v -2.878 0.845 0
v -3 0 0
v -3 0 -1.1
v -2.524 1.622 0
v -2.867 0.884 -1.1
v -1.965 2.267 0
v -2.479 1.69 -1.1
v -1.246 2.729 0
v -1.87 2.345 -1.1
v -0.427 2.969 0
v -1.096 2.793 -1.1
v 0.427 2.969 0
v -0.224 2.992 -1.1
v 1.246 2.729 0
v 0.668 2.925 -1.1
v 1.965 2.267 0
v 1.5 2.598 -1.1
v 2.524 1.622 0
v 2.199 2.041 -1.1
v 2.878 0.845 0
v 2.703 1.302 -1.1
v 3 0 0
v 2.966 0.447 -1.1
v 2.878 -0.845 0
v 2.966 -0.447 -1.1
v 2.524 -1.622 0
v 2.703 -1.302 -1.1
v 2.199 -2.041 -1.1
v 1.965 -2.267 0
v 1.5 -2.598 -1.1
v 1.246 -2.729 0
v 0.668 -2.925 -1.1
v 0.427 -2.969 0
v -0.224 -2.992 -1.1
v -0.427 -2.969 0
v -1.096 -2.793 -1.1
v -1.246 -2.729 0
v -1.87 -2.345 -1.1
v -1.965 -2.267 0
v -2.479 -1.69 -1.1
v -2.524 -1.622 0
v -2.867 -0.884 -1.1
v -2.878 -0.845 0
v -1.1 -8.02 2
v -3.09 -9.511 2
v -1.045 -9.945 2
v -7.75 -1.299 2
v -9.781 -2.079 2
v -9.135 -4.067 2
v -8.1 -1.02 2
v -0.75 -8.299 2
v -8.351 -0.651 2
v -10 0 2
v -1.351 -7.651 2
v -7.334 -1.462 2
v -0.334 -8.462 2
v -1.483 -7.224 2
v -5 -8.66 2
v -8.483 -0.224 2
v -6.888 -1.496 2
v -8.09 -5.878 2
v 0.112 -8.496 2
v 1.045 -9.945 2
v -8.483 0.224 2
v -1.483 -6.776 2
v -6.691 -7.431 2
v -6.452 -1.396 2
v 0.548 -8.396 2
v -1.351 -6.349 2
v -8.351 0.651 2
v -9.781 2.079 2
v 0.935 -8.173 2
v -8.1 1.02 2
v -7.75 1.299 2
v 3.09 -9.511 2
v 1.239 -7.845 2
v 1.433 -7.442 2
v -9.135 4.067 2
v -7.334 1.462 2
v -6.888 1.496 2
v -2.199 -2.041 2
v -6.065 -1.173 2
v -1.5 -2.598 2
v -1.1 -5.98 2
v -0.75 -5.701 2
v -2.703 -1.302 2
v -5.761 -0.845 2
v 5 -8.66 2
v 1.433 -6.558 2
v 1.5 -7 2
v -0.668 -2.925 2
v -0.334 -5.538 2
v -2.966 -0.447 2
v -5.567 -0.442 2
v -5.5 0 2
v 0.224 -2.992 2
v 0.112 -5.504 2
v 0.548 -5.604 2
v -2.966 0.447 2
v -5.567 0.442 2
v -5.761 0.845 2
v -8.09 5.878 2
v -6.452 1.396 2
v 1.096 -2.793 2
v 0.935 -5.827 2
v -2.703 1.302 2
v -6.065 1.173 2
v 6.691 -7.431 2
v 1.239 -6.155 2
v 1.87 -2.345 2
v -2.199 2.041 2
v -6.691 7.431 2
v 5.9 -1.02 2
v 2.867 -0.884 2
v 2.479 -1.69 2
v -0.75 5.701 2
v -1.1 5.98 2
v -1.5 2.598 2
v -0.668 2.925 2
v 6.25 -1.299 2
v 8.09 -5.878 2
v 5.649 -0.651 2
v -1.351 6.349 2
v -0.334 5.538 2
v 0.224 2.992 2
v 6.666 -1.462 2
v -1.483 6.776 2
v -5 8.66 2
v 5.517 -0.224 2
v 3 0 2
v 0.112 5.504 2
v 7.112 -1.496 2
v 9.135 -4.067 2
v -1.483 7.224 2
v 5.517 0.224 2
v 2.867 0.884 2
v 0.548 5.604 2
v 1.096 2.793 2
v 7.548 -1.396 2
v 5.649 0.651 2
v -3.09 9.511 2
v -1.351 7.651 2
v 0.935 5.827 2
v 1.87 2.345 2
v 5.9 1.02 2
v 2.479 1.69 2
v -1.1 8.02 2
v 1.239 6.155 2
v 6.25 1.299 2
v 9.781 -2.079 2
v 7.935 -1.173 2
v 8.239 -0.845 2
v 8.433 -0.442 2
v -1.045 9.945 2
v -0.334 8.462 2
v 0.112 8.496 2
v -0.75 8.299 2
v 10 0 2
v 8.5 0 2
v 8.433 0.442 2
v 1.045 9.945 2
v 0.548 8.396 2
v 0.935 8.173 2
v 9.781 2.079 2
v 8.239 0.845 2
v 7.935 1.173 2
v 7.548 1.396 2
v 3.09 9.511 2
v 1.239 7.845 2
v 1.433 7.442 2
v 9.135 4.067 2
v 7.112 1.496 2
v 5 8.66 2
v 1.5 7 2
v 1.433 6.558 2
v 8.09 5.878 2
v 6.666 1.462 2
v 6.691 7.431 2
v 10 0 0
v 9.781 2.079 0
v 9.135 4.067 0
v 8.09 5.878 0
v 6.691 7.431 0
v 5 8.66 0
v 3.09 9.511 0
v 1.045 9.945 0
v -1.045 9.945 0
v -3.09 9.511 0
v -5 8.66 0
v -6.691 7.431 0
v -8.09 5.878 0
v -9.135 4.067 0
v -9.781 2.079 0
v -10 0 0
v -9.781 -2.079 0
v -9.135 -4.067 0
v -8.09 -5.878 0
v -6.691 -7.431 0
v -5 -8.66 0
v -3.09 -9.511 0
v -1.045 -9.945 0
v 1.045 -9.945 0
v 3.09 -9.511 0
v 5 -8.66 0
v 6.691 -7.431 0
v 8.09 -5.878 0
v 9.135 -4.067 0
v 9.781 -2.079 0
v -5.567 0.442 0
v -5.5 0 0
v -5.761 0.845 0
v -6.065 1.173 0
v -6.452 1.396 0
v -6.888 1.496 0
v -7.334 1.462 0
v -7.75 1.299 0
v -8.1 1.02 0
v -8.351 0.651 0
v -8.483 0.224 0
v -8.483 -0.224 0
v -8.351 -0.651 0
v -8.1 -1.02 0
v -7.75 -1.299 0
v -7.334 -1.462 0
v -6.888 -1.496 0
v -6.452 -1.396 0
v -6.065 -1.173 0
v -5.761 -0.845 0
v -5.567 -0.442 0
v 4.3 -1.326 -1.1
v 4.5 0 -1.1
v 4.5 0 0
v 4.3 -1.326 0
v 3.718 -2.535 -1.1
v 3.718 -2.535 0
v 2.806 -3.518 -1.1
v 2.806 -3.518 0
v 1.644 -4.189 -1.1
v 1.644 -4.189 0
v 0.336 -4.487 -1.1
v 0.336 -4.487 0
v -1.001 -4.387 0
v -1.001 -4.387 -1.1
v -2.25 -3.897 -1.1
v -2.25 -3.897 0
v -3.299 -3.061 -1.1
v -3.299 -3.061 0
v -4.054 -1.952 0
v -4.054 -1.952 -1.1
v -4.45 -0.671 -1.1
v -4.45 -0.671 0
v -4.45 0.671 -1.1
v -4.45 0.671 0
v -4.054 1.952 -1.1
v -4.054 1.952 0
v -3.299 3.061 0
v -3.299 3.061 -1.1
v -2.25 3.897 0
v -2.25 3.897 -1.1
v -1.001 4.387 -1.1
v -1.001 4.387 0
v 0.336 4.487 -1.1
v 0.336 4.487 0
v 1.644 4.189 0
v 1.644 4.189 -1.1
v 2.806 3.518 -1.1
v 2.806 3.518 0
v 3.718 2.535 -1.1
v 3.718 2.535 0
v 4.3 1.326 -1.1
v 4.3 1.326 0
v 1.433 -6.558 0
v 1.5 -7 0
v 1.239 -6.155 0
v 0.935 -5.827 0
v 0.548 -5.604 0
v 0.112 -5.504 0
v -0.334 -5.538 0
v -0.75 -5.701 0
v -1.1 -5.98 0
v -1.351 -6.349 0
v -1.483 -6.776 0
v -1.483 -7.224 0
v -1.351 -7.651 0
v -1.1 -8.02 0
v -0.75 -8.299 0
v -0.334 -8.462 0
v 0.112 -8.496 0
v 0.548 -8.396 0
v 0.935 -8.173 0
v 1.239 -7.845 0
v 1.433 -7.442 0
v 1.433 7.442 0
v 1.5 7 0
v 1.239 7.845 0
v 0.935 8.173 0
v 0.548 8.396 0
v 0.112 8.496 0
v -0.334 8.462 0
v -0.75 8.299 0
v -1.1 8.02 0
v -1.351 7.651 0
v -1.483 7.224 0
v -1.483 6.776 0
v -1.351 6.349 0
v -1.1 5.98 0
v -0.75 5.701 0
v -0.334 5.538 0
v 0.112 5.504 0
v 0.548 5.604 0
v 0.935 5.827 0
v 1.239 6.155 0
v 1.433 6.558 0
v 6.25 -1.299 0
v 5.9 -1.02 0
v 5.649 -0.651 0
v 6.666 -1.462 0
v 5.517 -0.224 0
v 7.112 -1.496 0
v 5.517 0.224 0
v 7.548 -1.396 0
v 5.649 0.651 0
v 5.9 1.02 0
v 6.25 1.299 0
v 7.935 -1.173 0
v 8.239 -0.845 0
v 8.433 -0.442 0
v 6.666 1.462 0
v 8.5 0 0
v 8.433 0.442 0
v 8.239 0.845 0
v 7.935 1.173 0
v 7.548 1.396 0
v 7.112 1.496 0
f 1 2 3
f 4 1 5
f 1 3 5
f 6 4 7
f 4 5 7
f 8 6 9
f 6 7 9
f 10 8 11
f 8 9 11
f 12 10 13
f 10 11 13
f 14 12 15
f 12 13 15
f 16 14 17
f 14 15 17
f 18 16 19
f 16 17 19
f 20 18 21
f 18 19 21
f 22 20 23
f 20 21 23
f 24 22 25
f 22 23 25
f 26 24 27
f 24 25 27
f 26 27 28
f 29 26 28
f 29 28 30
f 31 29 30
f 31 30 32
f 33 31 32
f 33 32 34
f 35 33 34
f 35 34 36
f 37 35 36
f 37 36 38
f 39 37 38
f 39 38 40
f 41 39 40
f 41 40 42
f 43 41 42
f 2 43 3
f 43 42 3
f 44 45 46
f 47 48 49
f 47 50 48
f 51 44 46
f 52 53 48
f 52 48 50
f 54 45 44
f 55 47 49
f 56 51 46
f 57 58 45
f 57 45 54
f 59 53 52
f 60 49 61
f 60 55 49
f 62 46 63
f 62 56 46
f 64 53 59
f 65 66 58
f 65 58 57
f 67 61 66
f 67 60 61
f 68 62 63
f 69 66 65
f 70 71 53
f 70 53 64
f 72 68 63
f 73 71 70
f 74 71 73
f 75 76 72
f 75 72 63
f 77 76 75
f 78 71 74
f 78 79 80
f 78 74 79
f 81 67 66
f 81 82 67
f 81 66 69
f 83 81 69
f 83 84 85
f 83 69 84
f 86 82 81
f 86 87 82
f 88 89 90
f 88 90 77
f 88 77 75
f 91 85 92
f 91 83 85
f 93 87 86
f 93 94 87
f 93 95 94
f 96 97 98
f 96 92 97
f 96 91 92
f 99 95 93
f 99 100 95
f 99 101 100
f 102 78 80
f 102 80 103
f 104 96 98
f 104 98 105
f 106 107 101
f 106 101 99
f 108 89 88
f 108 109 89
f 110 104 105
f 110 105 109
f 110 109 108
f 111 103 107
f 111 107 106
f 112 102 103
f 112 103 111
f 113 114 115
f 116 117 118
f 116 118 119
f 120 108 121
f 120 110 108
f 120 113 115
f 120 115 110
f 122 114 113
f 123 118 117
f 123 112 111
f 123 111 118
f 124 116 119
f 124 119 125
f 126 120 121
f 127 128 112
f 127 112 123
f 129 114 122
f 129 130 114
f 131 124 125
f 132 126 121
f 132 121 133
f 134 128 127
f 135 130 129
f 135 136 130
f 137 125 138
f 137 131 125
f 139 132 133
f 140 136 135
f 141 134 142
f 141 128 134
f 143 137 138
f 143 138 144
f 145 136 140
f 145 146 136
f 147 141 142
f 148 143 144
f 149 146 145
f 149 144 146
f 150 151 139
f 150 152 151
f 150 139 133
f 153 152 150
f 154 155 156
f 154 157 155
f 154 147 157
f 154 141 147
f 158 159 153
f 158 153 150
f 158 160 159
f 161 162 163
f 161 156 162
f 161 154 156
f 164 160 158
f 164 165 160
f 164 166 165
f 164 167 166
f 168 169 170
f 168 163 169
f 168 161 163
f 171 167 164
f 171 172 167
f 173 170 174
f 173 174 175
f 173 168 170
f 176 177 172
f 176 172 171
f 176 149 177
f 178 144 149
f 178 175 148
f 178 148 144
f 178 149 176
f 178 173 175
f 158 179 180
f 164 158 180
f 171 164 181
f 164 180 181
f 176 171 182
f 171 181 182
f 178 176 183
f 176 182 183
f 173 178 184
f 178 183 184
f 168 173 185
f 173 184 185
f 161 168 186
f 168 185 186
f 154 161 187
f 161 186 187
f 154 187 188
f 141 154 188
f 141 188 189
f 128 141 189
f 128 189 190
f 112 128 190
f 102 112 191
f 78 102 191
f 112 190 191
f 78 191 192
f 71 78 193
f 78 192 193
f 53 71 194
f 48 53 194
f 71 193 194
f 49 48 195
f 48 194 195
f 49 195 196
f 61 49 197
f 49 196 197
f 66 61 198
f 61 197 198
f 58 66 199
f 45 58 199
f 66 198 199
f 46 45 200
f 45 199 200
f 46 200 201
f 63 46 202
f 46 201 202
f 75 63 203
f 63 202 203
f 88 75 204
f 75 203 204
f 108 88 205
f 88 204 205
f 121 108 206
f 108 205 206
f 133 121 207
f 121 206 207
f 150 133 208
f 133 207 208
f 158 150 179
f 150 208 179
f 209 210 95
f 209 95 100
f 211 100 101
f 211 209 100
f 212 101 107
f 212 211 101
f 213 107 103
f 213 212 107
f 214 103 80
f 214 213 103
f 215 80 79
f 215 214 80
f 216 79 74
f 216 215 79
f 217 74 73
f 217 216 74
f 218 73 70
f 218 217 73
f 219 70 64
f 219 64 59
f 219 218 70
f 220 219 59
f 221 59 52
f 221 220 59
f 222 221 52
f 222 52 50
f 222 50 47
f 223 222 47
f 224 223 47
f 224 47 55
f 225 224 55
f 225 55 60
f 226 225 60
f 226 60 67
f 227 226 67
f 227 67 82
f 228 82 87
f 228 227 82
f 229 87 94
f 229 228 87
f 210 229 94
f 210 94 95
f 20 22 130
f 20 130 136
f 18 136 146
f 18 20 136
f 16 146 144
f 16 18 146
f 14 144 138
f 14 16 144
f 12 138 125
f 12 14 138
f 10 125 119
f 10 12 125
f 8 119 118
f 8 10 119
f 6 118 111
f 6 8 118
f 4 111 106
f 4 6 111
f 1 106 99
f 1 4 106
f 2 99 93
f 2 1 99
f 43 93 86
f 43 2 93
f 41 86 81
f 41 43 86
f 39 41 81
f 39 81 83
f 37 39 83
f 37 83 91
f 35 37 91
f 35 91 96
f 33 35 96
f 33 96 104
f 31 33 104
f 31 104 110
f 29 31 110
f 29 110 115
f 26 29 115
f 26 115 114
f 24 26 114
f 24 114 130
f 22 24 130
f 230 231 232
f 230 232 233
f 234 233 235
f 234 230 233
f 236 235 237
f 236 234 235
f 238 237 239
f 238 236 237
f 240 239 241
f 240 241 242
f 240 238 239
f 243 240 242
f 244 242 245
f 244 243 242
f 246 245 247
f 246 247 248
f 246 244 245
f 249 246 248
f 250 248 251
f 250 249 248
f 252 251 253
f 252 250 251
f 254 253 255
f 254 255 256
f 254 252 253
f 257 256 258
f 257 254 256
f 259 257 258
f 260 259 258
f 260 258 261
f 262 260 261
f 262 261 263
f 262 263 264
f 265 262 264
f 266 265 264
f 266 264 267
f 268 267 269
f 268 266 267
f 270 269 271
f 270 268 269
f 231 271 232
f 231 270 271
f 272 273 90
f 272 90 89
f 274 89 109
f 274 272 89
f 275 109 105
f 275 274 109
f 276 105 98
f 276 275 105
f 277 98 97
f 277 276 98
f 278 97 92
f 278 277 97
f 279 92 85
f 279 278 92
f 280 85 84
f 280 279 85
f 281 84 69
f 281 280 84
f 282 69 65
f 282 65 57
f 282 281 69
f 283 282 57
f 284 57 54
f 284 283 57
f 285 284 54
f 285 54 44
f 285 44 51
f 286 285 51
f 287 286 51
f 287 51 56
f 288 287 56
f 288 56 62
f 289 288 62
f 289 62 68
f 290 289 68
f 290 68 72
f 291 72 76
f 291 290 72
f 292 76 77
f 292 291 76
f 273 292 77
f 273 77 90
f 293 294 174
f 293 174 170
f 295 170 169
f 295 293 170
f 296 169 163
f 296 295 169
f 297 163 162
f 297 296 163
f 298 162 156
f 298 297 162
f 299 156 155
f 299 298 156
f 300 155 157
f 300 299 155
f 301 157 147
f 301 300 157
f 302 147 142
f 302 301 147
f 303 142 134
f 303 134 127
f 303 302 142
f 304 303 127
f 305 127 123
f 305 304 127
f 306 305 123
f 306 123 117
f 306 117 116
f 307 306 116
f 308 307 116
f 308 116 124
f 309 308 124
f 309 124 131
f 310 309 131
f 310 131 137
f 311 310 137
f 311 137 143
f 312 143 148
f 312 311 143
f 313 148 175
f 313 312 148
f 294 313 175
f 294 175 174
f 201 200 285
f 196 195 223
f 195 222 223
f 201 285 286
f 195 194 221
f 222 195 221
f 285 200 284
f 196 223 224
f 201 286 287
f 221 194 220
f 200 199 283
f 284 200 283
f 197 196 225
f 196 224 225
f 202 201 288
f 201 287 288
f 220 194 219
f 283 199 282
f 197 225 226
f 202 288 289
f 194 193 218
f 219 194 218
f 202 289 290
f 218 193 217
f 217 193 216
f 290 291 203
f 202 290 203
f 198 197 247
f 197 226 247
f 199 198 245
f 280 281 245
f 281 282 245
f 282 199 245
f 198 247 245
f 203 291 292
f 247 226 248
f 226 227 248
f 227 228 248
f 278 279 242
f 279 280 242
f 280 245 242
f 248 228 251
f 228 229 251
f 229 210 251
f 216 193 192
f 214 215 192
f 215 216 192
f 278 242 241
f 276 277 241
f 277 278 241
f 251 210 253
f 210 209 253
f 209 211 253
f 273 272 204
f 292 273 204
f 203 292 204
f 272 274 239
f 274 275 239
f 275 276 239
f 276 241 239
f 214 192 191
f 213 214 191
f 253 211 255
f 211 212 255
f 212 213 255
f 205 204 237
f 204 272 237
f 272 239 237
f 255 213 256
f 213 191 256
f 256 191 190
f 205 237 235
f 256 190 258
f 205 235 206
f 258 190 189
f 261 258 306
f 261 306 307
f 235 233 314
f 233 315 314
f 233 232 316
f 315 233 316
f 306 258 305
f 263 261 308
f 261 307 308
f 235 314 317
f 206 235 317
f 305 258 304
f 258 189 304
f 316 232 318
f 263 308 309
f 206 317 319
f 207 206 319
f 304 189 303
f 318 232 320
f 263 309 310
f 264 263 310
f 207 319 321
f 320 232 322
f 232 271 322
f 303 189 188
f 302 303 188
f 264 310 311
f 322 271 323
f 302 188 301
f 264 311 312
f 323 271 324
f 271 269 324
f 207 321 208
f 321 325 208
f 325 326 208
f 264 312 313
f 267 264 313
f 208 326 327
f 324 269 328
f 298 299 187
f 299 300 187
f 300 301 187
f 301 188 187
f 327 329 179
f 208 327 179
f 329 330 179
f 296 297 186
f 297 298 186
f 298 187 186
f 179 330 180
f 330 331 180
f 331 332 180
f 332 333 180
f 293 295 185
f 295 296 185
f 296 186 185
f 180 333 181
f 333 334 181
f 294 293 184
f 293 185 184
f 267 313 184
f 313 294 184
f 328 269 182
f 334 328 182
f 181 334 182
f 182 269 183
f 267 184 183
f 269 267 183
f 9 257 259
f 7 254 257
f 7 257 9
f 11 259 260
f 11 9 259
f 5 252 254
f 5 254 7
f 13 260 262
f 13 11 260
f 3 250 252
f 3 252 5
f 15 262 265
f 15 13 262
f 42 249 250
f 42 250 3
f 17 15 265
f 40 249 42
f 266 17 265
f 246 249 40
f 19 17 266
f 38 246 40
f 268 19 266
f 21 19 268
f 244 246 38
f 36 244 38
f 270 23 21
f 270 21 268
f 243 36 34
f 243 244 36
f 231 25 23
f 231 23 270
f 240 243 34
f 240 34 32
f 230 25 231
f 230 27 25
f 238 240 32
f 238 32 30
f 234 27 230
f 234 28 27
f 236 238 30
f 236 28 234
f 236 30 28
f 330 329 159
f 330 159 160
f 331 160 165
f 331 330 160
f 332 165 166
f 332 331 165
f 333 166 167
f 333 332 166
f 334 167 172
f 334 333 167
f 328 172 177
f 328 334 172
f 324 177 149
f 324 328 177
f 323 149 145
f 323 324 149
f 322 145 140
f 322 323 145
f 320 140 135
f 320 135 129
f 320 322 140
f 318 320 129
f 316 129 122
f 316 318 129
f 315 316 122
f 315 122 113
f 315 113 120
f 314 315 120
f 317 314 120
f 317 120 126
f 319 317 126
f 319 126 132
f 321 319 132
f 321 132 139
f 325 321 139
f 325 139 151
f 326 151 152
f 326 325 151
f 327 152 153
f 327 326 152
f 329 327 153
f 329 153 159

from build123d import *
from build123d.topology import SkipClean

# Parameters (mm, degrees)
SKETCH_1_R      = 10
SKETCH_1_R_2    = 3
SKETCH_1_R_3    = 1.5
EXTRUDE_1_DEPTH = 2
EXTRUDE_START   = 1.1
SKETCH_2_R      = 4.5
SKETCH_2_R_2    = 3
EXTRUDE_2_DEPTH = 1.1


with BuildPart() as part:
    # ｽｹｯﾁ1 → ﾎﾞｽ - 押し出し1 (new body)
    with BuildSketch(Plane.XY):
        Circle(SKETCH_1_R)
        Circle(SKETCH_1_R_2, mode=Mode.SUBTRACT)
        with Locations((-7, 0)):
            Circle(SKETCH_1_R_3, mode=Mode.SUBTRACT)
        with Locations((7, 0)):
            Circle(SKETCH_1_R_3, mode=Mode.SUBTRACT)
        with Locations((0, 7)):
            Circle(SKETCH_1_R_3, mode=Mode.SUBTRACT)
        with Locations((0, -7)):
            Circle(SKETCH_1_R_3, mode=Mode.SUBTRACT)
    extrude(amount=EXTRUDE_1_DEPTH)

    # ｽｹｯﾁ2 → ﾎﾞｽ - 押し出し2 (add)
    with SkipClean():  # the faces are left unmerged after this step: merging them gives an invalid solid
        with BuildSketch(Plane(origin=(0, 0, 0), x_dir=(-1, 0, 0), z_dir=(0, 0, -1)).offset(EXTRUDE_START)):
            with Locations(Location((0, 0, 0), (0, 0, 180))):
                Circle(SKETCH_2_R)
            Circle(SKETCH_2_R_2, mode=Mode.SUBTRACT)
        extrude(amount=-EXTRUDE_2_DEPTH)


solid = part.part
